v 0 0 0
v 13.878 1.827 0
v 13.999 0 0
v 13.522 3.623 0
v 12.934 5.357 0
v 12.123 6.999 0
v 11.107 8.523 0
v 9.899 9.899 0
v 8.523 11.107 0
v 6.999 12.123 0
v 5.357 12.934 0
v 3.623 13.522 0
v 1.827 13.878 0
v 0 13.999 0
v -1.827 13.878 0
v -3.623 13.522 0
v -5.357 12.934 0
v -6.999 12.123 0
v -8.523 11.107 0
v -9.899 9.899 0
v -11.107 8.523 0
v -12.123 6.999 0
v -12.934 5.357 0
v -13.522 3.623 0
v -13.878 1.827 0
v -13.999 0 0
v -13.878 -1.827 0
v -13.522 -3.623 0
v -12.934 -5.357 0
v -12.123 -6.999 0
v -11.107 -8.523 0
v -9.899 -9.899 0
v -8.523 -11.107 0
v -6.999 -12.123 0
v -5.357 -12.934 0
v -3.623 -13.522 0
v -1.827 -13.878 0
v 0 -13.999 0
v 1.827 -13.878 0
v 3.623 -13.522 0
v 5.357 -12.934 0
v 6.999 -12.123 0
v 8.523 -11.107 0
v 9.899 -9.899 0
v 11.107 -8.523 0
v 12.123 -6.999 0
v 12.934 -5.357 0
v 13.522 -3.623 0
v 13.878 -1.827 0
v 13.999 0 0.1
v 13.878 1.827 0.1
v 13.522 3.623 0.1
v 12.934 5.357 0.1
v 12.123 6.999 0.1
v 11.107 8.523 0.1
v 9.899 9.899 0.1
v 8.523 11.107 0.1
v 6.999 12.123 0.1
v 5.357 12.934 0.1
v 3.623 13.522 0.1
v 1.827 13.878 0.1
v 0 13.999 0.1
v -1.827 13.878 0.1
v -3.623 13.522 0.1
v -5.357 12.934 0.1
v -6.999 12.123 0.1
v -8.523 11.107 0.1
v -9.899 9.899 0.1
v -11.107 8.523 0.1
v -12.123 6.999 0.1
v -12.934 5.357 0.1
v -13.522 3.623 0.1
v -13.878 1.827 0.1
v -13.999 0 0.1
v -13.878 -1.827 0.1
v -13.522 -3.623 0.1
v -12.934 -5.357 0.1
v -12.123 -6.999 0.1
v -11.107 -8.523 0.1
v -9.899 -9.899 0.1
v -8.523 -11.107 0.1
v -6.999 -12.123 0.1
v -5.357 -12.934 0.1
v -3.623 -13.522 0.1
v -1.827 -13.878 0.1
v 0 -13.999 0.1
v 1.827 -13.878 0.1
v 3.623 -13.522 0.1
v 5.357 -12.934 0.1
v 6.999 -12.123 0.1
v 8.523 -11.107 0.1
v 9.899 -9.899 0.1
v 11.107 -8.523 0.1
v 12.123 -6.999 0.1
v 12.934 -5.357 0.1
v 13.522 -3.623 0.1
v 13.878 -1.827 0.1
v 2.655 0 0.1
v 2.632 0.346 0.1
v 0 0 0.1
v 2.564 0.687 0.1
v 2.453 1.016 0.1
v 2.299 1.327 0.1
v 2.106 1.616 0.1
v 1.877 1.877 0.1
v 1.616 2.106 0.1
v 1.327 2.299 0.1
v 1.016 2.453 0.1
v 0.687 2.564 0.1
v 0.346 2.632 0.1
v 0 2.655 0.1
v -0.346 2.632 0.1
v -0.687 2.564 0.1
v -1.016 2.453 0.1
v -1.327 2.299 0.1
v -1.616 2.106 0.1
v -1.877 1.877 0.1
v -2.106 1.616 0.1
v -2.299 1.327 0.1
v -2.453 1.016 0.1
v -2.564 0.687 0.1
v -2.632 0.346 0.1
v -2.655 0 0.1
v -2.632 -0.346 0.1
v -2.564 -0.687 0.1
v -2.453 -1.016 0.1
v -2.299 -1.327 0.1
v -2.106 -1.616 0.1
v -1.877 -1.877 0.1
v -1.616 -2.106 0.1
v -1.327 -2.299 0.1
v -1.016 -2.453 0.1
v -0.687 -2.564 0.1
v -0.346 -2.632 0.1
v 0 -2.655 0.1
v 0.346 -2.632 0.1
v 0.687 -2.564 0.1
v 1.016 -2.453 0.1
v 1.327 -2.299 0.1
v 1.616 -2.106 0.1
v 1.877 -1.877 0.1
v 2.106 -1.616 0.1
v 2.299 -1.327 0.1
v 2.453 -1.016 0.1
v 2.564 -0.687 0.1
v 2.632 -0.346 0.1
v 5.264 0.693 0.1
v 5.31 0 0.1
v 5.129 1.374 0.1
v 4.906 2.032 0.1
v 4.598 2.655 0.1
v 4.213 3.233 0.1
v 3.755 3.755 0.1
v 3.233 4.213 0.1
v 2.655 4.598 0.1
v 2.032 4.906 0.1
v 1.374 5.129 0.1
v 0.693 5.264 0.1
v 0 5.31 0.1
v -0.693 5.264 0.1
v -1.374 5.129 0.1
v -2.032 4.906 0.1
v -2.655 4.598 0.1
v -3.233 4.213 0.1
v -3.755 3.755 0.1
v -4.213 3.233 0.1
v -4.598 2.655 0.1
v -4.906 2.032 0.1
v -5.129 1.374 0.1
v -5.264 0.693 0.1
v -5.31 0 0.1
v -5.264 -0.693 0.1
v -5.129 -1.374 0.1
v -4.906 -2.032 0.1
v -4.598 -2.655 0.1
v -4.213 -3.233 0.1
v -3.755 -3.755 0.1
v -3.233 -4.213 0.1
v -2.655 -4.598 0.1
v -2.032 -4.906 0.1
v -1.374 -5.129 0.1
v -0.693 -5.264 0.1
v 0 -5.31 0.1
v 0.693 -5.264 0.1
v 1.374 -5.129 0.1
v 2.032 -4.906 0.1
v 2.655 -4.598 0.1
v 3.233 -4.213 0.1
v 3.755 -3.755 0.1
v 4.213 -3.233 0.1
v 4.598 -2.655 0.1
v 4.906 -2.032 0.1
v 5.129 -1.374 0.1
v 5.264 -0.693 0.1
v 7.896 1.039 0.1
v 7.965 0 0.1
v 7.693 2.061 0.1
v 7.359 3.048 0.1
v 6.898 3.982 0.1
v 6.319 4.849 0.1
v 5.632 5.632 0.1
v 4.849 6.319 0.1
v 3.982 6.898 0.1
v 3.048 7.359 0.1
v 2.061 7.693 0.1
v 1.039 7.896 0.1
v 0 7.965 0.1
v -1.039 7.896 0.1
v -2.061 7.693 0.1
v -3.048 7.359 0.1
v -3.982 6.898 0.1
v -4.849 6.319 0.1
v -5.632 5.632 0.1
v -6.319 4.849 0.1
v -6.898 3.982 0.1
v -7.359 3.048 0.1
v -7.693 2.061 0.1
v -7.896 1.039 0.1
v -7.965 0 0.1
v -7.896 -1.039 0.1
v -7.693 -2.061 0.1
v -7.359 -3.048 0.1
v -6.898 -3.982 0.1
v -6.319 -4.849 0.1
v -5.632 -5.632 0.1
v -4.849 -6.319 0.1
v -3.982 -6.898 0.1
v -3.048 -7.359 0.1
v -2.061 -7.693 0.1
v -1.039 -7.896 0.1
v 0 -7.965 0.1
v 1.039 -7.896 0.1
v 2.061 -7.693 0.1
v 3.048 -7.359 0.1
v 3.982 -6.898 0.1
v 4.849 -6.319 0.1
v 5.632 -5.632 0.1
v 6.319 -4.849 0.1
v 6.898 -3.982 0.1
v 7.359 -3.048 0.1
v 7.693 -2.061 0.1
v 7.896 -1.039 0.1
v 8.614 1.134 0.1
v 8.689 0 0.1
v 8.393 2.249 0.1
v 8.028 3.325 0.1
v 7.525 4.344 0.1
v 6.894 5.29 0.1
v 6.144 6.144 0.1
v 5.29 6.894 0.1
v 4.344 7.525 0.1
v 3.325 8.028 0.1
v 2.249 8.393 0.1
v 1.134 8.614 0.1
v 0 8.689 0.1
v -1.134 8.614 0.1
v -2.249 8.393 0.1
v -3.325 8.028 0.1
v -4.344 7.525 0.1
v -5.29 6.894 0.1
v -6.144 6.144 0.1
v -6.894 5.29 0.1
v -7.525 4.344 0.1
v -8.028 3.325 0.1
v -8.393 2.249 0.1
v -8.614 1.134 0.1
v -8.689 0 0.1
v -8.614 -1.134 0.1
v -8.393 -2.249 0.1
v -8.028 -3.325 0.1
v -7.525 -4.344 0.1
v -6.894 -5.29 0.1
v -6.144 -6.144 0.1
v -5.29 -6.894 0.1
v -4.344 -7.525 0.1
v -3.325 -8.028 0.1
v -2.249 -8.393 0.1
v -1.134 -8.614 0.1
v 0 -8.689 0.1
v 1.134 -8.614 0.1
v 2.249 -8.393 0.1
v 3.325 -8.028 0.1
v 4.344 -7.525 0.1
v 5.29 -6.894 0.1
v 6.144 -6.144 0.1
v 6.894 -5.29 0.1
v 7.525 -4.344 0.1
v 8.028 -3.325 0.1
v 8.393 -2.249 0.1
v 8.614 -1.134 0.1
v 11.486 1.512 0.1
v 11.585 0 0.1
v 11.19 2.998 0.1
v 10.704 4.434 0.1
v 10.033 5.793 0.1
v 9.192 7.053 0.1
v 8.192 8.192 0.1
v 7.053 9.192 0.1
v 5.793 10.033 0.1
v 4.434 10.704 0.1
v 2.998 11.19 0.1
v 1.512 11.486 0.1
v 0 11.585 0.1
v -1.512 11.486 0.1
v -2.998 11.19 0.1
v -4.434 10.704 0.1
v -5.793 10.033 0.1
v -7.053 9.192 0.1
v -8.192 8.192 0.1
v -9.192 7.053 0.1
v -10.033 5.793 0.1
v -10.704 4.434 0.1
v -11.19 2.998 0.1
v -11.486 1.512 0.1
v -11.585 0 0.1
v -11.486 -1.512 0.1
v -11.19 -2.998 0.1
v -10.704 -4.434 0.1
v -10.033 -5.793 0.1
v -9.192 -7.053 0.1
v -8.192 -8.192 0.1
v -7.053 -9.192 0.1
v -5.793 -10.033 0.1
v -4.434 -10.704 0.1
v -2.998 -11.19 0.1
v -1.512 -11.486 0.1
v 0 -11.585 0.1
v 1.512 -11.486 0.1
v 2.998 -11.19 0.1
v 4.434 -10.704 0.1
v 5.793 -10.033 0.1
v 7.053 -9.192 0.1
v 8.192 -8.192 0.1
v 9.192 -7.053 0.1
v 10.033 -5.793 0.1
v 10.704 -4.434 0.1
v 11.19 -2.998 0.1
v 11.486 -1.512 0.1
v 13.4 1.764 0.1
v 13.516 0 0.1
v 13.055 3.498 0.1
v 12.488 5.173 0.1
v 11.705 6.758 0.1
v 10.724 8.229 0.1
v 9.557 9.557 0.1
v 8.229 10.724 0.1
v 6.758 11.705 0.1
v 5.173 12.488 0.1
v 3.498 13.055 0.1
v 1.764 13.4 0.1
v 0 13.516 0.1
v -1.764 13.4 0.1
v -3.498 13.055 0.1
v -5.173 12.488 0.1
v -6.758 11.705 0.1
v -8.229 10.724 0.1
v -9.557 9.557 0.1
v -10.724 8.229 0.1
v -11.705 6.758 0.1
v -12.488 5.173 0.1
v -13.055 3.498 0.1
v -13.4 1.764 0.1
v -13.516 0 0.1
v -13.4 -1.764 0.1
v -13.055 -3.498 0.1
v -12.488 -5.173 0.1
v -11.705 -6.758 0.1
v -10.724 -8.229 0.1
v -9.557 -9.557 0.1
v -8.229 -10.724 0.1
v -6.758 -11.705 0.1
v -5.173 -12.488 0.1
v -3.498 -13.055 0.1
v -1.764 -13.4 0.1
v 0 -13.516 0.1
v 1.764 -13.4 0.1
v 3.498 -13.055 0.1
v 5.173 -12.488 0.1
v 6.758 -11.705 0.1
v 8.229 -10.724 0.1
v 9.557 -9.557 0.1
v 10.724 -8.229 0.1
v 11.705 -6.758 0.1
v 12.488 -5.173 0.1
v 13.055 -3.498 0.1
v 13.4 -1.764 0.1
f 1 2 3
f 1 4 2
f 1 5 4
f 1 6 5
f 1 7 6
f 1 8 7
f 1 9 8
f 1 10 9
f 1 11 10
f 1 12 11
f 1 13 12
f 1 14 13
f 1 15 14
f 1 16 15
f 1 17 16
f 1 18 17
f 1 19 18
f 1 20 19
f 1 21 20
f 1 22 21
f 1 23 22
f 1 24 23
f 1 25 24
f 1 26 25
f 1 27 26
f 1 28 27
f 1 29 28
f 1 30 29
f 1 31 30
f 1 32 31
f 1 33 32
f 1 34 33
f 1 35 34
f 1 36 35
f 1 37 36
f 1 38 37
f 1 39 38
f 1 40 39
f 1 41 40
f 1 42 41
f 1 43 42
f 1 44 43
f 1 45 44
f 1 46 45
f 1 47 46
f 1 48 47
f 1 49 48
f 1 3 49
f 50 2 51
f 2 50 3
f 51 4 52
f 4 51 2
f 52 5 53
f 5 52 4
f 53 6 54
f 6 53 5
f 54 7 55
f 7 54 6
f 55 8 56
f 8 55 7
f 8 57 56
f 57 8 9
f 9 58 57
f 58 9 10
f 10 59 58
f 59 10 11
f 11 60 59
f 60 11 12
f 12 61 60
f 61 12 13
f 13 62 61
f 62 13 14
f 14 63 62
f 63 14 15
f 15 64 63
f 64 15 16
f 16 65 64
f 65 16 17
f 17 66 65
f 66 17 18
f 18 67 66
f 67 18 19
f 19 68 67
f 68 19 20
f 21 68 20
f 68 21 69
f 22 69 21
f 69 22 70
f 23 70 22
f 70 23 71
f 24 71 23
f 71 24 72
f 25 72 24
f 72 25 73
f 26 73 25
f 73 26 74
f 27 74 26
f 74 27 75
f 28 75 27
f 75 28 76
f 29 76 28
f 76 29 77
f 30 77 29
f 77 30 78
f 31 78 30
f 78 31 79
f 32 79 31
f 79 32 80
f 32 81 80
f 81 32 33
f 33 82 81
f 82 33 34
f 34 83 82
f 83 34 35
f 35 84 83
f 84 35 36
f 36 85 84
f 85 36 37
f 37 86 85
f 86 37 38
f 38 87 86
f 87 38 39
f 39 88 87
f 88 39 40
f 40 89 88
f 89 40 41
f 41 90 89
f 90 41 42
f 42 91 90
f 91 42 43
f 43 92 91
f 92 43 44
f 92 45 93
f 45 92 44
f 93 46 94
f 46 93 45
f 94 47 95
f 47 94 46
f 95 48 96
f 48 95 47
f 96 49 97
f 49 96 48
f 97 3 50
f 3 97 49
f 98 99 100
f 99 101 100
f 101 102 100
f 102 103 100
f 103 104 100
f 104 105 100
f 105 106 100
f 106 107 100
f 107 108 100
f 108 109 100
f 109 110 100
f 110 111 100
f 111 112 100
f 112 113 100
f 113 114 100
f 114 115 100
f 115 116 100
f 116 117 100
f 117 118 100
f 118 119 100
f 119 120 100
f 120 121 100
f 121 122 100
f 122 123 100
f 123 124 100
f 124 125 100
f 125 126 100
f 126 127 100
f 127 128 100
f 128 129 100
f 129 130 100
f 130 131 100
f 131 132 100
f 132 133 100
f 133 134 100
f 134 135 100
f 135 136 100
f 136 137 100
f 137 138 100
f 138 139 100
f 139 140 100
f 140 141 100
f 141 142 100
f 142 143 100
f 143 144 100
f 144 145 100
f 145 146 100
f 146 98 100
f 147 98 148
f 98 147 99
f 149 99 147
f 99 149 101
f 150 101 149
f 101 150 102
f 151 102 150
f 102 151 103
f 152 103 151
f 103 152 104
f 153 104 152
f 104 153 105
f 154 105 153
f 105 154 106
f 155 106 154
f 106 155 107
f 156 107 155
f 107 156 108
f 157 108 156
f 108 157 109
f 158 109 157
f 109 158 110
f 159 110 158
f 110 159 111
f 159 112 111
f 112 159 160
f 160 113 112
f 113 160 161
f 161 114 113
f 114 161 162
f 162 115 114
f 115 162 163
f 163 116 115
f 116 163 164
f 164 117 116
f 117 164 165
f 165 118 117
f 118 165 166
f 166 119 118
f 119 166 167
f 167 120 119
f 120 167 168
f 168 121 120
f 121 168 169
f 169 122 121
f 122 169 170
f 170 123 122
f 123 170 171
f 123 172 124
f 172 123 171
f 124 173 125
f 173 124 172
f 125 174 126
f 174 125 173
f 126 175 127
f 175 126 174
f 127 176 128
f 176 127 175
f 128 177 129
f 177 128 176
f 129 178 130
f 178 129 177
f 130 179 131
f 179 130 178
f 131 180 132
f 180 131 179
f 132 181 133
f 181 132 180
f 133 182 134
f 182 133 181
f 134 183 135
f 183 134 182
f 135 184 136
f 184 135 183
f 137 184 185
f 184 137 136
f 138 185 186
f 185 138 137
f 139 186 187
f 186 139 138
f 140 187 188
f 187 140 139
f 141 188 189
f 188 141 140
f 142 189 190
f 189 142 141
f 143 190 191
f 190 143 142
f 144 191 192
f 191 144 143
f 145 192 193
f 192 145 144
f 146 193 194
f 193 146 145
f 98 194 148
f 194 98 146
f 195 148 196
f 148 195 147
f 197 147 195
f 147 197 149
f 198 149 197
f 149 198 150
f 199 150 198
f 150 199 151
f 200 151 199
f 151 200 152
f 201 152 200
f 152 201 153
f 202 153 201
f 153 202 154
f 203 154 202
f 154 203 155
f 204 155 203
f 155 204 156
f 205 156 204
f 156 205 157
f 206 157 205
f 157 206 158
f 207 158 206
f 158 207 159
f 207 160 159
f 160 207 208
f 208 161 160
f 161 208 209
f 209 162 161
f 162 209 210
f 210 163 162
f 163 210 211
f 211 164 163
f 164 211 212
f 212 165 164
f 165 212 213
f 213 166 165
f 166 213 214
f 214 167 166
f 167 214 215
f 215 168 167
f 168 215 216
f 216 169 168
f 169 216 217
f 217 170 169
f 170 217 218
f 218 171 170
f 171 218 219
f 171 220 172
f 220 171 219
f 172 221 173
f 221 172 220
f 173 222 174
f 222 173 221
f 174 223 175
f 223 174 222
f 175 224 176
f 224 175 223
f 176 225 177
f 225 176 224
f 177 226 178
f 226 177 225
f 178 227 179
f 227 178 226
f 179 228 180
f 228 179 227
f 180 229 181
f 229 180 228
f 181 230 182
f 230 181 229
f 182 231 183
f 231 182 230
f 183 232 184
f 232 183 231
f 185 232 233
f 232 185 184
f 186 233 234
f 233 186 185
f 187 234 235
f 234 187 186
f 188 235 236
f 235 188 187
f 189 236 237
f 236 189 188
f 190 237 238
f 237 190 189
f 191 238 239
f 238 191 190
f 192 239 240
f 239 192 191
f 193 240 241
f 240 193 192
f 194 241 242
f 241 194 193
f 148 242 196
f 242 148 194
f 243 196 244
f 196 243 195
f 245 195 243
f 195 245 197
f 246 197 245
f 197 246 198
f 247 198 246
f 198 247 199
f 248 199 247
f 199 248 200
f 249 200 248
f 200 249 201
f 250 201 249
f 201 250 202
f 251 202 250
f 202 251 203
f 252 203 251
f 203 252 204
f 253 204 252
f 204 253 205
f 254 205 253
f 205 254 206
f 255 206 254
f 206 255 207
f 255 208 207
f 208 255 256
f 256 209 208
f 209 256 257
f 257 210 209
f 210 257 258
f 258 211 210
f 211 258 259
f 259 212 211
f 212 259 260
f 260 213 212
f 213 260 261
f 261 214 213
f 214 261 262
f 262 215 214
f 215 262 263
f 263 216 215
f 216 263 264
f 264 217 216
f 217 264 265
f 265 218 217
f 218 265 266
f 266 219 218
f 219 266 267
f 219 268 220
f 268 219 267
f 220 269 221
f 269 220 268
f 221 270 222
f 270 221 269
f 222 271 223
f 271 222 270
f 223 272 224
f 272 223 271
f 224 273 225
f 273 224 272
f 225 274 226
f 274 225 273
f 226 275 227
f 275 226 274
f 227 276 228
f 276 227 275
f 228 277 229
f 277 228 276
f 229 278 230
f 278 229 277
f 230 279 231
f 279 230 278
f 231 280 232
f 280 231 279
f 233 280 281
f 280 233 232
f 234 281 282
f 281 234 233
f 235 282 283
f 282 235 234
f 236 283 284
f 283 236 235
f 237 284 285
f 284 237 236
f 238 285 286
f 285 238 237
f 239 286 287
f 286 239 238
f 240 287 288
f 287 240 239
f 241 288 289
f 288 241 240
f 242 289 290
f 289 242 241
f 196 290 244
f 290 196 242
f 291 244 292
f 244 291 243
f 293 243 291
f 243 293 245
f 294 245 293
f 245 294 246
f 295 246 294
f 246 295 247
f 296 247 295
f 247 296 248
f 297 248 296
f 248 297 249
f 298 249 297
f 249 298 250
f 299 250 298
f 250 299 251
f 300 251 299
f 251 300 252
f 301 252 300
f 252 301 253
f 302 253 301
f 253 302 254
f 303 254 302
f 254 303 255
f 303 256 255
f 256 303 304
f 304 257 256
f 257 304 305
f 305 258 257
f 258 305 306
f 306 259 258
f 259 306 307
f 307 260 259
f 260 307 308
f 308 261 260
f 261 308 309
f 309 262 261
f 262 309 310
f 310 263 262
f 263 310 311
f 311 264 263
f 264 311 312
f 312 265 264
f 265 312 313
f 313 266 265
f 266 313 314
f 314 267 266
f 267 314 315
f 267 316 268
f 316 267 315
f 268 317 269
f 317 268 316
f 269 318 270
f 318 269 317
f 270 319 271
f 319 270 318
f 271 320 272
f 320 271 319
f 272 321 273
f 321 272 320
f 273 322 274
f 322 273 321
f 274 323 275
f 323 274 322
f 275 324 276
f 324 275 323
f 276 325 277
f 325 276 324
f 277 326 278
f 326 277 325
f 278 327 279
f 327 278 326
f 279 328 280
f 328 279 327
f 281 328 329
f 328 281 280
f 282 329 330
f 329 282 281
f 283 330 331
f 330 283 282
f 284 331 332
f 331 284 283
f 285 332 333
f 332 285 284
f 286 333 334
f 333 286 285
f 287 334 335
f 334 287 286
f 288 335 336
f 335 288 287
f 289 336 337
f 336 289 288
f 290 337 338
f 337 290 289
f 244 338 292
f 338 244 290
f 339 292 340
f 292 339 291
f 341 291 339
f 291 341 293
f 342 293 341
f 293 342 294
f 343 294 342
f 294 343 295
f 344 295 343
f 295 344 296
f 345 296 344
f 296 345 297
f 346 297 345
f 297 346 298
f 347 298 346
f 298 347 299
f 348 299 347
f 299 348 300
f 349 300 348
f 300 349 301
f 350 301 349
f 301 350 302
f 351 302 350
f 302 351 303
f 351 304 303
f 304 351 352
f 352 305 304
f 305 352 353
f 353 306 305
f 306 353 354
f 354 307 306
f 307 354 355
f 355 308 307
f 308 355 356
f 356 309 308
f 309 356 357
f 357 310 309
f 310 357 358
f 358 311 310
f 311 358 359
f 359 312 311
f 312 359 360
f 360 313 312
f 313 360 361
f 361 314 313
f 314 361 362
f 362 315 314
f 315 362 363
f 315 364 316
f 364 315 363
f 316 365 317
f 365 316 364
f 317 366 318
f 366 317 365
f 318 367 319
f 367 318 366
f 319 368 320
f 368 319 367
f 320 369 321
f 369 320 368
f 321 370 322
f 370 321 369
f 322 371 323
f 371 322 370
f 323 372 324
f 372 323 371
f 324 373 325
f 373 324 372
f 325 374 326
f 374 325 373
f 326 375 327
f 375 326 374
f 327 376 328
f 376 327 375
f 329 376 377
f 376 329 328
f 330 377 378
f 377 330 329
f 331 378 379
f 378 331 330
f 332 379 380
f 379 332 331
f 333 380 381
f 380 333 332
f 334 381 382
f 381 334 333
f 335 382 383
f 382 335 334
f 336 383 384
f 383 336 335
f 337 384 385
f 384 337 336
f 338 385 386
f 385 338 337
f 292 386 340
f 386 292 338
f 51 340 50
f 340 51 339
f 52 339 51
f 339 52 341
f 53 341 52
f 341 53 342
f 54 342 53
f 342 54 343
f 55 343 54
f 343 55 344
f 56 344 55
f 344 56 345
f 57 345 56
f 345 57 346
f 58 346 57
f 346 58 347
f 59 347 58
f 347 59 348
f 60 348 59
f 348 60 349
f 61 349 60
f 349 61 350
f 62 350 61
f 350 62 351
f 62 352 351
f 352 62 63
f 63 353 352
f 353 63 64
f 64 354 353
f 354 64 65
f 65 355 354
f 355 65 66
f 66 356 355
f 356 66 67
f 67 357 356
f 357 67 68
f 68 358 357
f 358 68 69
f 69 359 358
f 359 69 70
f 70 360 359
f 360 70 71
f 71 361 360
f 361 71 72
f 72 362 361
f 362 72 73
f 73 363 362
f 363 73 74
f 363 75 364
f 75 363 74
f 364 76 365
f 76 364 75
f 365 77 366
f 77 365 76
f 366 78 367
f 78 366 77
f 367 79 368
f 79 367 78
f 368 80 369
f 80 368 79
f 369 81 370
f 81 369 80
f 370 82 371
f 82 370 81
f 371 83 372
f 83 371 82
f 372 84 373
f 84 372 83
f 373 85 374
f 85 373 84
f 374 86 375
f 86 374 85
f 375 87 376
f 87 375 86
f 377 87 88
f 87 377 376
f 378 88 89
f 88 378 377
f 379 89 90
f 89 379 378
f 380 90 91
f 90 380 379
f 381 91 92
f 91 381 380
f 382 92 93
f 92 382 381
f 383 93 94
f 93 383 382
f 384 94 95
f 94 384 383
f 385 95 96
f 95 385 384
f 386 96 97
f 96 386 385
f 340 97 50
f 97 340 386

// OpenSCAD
use <../lib.scad>
use <6005745a.scad>
function ldraw_lib__6005745b() = [
// 0 Sticker  3.5 x  3.5 Round with RAF Roundel
// 0 Name: 6005745b.dat
// 0 Author: J.C. Tchang [tchang]
// 0 !LDRAW_ORG Part UPDATE 2013-02
// 0 !LICENSE Licensed under CC BY 2.0 and CC BY 4.0 : see CAreadme.txt
// 
// 0 BFC CERTIFY CCW
  [0,"BFC","CERTIFY"],
  [0,"BFC","CCW"],
// 
// 0 !KEYWORDS Royal Air Force, Set 10226, Sopwith Camel
// 
// 0 !HISTORY 2013-12-23 [PTadmin] Official Update 2013-02
// 
// 
// 1 16 0 0 0 0.6034 0 0 0 1 0 0 0 0.6034 6005745a.dat
  [1,16,0,0,0,0.6034,0,0,0,1,0,0,0,0.6034, ldraw_lib__6005745a()],
];
makepoly(ldraw_lib__6005745b(), line=0.2);
